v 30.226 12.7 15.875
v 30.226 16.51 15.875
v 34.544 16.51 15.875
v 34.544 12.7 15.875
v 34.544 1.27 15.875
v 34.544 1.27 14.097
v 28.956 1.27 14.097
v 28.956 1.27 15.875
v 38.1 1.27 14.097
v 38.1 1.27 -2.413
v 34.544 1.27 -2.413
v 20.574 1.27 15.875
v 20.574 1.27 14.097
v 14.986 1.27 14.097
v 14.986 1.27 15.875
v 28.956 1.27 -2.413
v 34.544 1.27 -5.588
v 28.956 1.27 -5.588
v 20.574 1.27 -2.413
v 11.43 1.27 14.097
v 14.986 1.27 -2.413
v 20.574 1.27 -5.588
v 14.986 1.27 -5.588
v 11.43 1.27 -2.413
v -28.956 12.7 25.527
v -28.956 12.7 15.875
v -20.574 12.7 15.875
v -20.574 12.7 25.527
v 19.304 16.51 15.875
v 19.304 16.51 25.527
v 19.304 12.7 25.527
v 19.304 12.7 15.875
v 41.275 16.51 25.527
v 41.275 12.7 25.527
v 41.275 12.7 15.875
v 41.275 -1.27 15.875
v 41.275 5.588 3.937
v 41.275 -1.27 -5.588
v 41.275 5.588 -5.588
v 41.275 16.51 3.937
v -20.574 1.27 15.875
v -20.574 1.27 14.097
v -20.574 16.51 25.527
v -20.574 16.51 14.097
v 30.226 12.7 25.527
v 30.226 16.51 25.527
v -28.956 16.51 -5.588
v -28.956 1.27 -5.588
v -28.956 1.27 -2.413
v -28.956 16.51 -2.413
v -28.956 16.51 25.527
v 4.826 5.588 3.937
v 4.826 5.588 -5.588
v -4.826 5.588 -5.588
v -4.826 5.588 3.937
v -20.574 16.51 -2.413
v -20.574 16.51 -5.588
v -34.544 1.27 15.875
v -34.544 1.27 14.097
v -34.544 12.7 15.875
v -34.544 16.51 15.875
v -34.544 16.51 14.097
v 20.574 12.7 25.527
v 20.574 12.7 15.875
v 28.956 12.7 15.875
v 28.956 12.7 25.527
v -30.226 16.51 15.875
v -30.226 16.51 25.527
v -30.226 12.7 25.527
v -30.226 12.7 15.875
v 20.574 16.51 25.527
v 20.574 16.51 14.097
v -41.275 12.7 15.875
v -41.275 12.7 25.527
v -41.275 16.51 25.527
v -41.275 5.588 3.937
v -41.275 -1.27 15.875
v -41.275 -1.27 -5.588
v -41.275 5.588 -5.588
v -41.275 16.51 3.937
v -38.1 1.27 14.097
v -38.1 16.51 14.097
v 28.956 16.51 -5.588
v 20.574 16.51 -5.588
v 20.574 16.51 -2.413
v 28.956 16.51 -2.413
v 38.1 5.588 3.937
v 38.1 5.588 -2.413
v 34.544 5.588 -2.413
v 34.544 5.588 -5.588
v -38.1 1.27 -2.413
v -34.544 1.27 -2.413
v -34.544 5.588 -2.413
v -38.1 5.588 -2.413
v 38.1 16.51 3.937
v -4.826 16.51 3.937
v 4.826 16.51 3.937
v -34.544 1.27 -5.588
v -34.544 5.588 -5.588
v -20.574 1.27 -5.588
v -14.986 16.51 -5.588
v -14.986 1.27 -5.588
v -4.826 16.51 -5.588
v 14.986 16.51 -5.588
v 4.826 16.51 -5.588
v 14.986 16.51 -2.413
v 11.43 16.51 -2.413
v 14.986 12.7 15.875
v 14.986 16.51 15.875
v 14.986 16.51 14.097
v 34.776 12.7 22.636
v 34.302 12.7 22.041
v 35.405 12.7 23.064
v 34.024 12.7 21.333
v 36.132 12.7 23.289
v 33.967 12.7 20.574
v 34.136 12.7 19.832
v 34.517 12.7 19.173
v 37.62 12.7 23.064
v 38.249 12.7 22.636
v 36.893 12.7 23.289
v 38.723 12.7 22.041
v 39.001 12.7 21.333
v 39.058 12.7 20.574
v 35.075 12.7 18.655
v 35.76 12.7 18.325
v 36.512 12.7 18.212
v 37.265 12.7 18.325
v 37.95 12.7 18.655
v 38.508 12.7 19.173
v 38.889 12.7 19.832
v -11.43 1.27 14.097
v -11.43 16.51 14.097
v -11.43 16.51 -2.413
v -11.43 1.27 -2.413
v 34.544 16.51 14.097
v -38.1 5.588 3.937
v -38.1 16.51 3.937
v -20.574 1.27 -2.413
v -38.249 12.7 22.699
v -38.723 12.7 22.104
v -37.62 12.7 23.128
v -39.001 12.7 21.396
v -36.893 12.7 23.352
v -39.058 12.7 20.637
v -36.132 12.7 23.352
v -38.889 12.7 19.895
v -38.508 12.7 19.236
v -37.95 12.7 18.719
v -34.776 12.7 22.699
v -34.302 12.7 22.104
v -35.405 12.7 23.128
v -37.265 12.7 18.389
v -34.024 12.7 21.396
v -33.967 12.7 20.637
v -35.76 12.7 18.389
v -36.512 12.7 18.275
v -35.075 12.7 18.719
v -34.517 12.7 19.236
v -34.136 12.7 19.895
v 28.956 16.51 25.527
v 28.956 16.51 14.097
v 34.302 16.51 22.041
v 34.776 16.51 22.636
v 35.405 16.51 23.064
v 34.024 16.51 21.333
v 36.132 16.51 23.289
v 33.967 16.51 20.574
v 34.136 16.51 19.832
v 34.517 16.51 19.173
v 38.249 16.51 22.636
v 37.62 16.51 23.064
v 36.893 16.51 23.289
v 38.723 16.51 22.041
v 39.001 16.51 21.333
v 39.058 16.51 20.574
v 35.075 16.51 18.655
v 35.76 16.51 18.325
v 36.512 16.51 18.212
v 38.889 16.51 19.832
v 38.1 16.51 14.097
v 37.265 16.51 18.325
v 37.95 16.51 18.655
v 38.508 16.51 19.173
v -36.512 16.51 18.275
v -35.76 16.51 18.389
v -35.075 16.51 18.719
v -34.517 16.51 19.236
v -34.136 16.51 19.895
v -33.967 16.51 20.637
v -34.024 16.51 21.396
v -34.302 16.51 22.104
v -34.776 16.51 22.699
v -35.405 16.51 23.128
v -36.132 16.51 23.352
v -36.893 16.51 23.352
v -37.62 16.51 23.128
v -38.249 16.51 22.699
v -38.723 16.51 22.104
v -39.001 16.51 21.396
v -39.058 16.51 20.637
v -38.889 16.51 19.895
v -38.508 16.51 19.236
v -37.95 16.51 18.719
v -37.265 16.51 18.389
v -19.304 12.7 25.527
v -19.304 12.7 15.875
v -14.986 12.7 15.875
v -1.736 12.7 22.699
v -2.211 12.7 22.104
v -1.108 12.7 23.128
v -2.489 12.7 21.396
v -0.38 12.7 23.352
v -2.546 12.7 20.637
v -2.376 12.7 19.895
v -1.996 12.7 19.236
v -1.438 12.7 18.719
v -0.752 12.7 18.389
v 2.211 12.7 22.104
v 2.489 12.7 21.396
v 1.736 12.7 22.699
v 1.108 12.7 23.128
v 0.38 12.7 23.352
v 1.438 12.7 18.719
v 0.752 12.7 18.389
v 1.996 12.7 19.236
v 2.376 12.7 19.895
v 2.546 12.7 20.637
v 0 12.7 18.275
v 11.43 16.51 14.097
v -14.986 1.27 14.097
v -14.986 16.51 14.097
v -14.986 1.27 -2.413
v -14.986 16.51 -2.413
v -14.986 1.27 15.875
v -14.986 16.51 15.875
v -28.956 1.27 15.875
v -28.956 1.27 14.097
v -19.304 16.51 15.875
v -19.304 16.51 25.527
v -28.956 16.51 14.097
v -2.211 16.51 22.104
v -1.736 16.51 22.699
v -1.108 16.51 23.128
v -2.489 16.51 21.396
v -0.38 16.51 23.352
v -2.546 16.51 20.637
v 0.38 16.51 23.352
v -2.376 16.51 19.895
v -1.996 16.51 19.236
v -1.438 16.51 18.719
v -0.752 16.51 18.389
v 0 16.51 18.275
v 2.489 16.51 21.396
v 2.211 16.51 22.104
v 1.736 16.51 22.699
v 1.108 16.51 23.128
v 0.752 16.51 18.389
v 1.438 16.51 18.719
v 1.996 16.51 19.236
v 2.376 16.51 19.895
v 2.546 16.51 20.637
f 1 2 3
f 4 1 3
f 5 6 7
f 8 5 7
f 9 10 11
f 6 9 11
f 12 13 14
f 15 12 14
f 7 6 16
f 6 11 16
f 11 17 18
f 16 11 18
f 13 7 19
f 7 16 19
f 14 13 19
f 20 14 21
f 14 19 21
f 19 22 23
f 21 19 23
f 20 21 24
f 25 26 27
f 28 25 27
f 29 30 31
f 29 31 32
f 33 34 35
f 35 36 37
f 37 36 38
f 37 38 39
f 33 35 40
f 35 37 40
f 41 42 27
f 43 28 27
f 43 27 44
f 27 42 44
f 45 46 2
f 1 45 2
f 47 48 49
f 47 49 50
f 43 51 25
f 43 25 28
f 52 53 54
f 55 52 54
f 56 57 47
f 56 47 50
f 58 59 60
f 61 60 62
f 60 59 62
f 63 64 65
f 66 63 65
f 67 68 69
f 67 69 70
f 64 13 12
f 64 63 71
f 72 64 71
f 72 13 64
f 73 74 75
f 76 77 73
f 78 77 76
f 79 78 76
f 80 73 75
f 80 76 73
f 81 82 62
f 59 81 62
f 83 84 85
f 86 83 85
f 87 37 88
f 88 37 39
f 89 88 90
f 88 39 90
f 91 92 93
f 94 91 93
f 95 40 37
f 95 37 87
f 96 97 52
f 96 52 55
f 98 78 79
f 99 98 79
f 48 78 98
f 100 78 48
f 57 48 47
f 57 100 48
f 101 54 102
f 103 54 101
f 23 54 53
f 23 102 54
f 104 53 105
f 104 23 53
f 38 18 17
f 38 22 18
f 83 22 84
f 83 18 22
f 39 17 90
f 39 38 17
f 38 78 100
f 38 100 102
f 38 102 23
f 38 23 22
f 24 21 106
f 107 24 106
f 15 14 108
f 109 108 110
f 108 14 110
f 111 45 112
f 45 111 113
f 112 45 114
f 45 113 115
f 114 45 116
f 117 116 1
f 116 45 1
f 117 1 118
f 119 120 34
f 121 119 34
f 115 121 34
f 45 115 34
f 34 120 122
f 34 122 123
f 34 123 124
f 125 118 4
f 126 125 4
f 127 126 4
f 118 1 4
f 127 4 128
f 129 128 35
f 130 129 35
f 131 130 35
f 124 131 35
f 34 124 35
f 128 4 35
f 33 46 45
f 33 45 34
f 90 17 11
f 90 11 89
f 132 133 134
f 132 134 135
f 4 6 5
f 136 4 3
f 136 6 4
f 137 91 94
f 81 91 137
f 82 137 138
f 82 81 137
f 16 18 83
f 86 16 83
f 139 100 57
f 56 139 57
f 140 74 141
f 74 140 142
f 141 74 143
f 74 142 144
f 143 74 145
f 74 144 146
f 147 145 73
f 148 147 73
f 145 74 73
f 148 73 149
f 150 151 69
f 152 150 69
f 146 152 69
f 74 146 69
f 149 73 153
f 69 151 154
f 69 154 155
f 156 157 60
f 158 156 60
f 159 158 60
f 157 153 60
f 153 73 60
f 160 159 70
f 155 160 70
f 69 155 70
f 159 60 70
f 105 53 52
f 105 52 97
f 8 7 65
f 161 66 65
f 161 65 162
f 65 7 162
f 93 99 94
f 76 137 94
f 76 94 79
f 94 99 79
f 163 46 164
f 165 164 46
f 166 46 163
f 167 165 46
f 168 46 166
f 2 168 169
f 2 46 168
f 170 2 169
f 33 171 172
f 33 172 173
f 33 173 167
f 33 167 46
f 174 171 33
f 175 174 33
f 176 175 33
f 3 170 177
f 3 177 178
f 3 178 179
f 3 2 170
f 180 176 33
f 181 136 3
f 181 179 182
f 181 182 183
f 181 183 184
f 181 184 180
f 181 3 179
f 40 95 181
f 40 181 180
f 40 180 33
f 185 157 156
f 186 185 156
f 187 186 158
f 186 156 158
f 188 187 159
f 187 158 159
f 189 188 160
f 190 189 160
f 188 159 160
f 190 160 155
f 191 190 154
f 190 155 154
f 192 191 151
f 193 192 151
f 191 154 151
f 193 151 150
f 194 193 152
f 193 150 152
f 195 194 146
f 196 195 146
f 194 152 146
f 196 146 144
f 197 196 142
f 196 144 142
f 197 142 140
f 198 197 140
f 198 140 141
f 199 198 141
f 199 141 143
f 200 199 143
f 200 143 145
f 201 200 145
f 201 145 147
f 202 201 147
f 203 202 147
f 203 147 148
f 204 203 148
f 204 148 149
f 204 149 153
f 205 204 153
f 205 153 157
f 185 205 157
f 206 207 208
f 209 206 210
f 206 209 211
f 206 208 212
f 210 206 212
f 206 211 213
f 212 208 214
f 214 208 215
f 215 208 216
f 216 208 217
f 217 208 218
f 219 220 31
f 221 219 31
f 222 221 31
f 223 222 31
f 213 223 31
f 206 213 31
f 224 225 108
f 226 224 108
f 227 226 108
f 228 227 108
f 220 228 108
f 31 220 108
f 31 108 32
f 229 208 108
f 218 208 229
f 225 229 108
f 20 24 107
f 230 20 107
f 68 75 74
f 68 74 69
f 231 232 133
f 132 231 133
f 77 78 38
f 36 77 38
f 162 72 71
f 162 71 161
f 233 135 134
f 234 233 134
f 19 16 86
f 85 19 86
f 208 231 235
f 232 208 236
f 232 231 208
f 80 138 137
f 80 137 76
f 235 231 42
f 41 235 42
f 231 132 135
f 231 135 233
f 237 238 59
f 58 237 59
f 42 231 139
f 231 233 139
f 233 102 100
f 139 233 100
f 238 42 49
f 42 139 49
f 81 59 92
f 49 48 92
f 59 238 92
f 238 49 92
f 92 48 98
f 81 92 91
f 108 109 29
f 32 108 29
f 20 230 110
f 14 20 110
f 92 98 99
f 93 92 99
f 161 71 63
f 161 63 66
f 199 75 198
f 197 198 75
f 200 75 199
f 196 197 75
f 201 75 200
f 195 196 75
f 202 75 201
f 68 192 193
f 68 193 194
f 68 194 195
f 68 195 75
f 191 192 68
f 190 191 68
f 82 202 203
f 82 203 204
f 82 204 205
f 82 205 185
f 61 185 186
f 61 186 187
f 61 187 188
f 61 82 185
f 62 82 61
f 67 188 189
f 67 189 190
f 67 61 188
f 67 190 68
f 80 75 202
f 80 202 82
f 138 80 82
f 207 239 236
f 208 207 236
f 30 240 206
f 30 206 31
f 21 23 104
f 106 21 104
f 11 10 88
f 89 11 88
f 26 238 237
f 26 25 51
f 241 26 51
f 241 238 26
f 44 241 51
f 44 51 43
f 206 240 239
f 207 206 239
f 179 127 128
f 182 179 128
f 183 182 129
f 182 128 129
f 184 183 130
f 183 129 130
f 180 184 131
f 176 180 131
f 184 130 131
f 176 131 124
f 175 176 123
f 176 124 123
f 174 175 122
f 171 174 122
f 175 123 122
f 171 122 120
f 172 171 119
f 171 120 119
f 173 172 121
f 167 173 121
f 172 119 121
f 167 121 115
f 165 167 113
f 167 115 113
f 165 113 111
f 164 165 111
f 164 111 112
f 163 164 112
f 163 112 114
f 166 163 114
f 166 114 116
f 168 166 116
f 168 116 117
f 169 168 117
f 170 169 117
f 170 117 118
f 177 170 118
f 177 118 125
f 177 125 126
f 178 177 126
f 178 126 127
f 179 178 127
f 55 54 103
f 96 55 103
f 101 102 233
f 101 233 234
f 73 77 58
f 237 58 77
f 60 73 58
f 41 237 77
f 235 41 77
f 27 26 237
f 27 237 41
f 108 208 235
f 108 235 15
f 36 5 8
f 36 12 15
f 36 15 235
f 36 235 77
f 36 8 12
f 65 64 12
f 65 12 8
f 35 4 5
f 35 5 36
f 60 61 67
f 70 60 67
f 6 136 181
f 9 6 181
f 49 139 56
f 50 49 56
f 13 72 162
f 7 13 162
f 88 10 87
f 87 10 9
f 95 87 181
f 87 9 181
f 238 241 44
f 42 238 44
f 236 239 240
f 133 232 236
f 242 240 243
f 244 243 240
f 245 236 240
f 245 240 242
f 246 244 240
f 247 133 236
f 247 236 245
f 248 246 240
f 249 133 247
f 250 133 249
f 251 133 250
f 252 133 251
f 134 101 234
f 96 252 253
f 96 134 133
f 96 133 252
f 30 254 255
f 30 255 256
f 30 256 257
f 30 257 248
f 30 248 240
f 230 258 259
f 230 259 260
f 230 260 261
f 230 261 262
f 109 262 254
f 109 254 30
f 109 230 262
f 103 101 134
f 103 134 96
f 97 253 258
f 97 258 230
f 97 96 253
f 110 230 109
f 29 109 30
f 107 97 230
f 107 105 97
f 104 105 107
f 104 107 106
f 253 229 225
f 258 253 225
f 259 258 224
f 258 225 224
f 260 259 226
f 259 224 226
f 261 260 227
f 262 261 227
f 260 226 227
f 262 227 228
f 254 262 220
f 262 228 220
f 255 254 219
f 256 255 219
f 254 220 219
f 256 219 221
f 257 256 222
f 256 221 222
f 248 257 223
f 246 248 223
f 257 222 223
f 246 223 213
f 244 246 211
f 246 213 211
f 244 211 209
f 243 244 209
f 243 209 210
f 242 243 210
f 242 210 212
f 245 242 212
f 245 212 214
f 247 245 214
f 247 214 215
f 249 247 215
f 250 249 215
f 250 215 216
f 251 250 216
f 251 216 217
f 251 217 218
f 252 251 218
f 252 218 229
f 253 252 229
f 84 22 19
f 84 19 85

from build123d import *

# Parameters (mm, degrees)
SKETCH1_W              = 82.55
SKETCH1_H              = 21.463
PLATE_DEPTH            = 1.27
SKETCH4_W              = 82.55
SKETCH4_H              = 15.24
BOSS_EXTRUDE1_DEPTH    = 1.778
SKETCH5_W              = 3.175
SKETCH5_H              = 15.24
BOSS_EXTRUDE2_DEPTH    = 19.685
BOSS_EXTRUDE5_REACH    = 84.613
SKETCH9_W              = 3.175
SKETCH9_H              = 15.24
BOSS_EXTRUDE6_REACH    = 50.618
SKETCH11_W             = 5.588
SKETCH11_H             = 15.24
CUT_EXTRUDE1_DEPTH     = 50.364623912
SKETCH13_W             = 82.55
SKETCH13_H             = 3.81
BOSS_EXTRUDE7_DEPTH    = 9.652
F_10_CLEARANCE_HOLE1_D = 5.1054
SKETCH16_W             = 6.985
SKETCH16_H             = 10.922
SKETCH16_W_2           = 9.652
CUT_EXTRUDE4_DEPTH     = 9.525
SKETCH18_W             = 1.27
SKETCH18_H             = 9.652
CUT_EXTRUDE6_DEPTH     = 52.685411423


with BuildPart() as part:
    # Sketch1 → Plate (new, symmetric)
    with BuildSketch(Plane(origin=(0, 0, 0), x_dir=(1, 0, 0), z_dir=(0, 1, 0))):
        with Locations((0, -5.1435)):
            Rectangle(SKETCH1_W, SKETCH1_H)
    extrude(amount=PLATE_DEPTH, both=True)

    # Sketch4 → Boss-Extrude1 (add)
    with BuildSketch(Plane.XY.offset(15.875)):
        with Locations((0, 8.89)):
            Rectangle(SKETCH4_W, SKETCH4_H)
    extrude(amount=-BOSS_EXTRUDE1_DEPTH)

    # Sketch5 → Boss-Extrude2 (add)
    with BuildSketch(Plane(origin=(0, 0, 14.097), x_dir=(-1, 0, 0), z_dir=(0, 0, -1))):
        with Locations((-39.6875, 8.89)):
            Rectangle(SKETCH5_W, SKETCH5_H)
        with Locations((39.6875, 8.89)):
            Rectangle(SKETCH5_W, SKETCH5_H)
    extrude(amount=BOSS_EXTRUDE2_DEPTH)

    # Sketch9 → Boss-Extrude5 (add, up to next)
    with BuildSketch(Plane.ZY.offset(-38.1), mode=Mode.PRIVATE) as boss_extrude5_sk1:
        with Locations((-4.0005, 8.89)):
            Rectangle(SKETCH9_W, SKETCH9_H)
    boss_extrude5_tool1 = extrude(boss_extrude5_sk1.sketch, amount=BOSS_EXTRUDE5_REACH, mode=Mode.PRIVATE) - part.part
    add(boss_extrude5_tool1.solids().sort_by_distance((38.1, 8.89, -4.0005))[0])

    # Sketch10 → Boss-Extrude6 (add, up to next)
    with BuildSketch(Plane(origin=(0, 0, 14.097), x_dir=(-1, 0, 0), z_dir=(0, 0, -1)), mode=Mode.PRIVATE) as boss_extrude6_sk1:
        Polygon((-8.255, 1.27), (-11.43, 1.27), (-11.43, 16.51), (-8.255, 16.51), (8.255, 16.51), (11.43, 16.51), (11.43, 1.27), (8.255, 1.27), align=None)
    boss_extrude6_tool1 = extrude(boss_extrude6_sk1.sketch, amount=BOSS_EXTRUDE6_REACH, mode=Mode.PRIVATE) - part.part
    add(boss_extrude6_tool1.solids().sort_by_distance((0, 8.89, 14.097))[0])

    # Sketch11 → Cut-Extrude1 (cut, through all)
    with BuildSketch(Plane(origin=(0, 0, -5.588), x_dir=(-1, 0, 0), z_dir=(0, 0, -1))):
        with Locations((-31.75, 8.89)):
            Rectangle(SKETCH11_W, SKETCH11_H)
        with Locations((31.75, 8.89)):
            Rectangle(SKETCH11_W, SKETCH11_H)
        with Locations((-17.78, 8.89)):
            Rectangle(SKETCH11_W, SKETCH11_H)
        with Locations((17.78, 8.89)):
            Rectangle(SKETCH11_W, SKETCH11_H)
    extrude(amount=-CUT_EXTRUDE1_DEPTH, mode=Mode.SUBTRACT)

    # Sketch13 → Boss-Extrude7 (add)
    with BuildSketch(Plane.XY.offset(15.875)):
        with Locations((0, 14.605)):
            Rectangle(SKETCH13_W, SKETCH13_H)
    extrude(amount=BOSS_EXTRUDE7_DEPTH)

    # #10 Clearance Hole1 (through all)
    with Locations(Plane(origin=(36.5125, 16.51, 20.7645), x_dir=(0, 0, 1), z_dir=(0, 1, 0))):
        with Locations((0, 0), (0.0635, -36.5125), (0.0635, -73.025)):
            Hole(F_10_CLEARANCE_HOLE1_D / 2)

    # Sketch16 → Cut-Extrude4 (cut)
    with BuildSketch(Plane(origin=(0, 0, -5.588), x_dir=(-1, 0, 0), z_dir=(0, 0, -1))):
        with Locations((-37.7825, 11.049)):
            Rectangle(SKETCH16_W, SKETCH16_H)
        with Locations((37.7825, 11.049)):
            Rectangle(SKETCH16_W, SKETCH16_H)
        with Locations((0, 11.049)):
            Rectangle(SKETCH16_W_2, SKETCH16_H)
    extrude(amount=-CUT_EXTRUDE4_DEPTH, mode=Mode.SUBTRACT)

    # Sketch18 → Cut-Extrude6 (cut, through all)
    with BuildSketch(Plane(origin=(0, 16.51, 0), x_dir=(1, 0, 0), z_dir=(0, 1, 0))):
        with Locations((-29.591, -20.701)):
            Rectangle(SKETCH18_W, SKETCH18_H)
        with Locations((-19.939, -20.701)):
            Rectangle(SKETCH18_W, SKETCH18_H)
        with Locations((19.939, -20.701)):
            Rectangle(SKETCH18_W, SKETCH18_H)
        with Locations((29.591, -20.701)):
            Rectangle(SKETCH18_W, SKETCH18_H)
    extrude(amount=-CUT_EXTRUDE6_DEPTH, mode=Mode.SUBTRACT)


solid = part.part
